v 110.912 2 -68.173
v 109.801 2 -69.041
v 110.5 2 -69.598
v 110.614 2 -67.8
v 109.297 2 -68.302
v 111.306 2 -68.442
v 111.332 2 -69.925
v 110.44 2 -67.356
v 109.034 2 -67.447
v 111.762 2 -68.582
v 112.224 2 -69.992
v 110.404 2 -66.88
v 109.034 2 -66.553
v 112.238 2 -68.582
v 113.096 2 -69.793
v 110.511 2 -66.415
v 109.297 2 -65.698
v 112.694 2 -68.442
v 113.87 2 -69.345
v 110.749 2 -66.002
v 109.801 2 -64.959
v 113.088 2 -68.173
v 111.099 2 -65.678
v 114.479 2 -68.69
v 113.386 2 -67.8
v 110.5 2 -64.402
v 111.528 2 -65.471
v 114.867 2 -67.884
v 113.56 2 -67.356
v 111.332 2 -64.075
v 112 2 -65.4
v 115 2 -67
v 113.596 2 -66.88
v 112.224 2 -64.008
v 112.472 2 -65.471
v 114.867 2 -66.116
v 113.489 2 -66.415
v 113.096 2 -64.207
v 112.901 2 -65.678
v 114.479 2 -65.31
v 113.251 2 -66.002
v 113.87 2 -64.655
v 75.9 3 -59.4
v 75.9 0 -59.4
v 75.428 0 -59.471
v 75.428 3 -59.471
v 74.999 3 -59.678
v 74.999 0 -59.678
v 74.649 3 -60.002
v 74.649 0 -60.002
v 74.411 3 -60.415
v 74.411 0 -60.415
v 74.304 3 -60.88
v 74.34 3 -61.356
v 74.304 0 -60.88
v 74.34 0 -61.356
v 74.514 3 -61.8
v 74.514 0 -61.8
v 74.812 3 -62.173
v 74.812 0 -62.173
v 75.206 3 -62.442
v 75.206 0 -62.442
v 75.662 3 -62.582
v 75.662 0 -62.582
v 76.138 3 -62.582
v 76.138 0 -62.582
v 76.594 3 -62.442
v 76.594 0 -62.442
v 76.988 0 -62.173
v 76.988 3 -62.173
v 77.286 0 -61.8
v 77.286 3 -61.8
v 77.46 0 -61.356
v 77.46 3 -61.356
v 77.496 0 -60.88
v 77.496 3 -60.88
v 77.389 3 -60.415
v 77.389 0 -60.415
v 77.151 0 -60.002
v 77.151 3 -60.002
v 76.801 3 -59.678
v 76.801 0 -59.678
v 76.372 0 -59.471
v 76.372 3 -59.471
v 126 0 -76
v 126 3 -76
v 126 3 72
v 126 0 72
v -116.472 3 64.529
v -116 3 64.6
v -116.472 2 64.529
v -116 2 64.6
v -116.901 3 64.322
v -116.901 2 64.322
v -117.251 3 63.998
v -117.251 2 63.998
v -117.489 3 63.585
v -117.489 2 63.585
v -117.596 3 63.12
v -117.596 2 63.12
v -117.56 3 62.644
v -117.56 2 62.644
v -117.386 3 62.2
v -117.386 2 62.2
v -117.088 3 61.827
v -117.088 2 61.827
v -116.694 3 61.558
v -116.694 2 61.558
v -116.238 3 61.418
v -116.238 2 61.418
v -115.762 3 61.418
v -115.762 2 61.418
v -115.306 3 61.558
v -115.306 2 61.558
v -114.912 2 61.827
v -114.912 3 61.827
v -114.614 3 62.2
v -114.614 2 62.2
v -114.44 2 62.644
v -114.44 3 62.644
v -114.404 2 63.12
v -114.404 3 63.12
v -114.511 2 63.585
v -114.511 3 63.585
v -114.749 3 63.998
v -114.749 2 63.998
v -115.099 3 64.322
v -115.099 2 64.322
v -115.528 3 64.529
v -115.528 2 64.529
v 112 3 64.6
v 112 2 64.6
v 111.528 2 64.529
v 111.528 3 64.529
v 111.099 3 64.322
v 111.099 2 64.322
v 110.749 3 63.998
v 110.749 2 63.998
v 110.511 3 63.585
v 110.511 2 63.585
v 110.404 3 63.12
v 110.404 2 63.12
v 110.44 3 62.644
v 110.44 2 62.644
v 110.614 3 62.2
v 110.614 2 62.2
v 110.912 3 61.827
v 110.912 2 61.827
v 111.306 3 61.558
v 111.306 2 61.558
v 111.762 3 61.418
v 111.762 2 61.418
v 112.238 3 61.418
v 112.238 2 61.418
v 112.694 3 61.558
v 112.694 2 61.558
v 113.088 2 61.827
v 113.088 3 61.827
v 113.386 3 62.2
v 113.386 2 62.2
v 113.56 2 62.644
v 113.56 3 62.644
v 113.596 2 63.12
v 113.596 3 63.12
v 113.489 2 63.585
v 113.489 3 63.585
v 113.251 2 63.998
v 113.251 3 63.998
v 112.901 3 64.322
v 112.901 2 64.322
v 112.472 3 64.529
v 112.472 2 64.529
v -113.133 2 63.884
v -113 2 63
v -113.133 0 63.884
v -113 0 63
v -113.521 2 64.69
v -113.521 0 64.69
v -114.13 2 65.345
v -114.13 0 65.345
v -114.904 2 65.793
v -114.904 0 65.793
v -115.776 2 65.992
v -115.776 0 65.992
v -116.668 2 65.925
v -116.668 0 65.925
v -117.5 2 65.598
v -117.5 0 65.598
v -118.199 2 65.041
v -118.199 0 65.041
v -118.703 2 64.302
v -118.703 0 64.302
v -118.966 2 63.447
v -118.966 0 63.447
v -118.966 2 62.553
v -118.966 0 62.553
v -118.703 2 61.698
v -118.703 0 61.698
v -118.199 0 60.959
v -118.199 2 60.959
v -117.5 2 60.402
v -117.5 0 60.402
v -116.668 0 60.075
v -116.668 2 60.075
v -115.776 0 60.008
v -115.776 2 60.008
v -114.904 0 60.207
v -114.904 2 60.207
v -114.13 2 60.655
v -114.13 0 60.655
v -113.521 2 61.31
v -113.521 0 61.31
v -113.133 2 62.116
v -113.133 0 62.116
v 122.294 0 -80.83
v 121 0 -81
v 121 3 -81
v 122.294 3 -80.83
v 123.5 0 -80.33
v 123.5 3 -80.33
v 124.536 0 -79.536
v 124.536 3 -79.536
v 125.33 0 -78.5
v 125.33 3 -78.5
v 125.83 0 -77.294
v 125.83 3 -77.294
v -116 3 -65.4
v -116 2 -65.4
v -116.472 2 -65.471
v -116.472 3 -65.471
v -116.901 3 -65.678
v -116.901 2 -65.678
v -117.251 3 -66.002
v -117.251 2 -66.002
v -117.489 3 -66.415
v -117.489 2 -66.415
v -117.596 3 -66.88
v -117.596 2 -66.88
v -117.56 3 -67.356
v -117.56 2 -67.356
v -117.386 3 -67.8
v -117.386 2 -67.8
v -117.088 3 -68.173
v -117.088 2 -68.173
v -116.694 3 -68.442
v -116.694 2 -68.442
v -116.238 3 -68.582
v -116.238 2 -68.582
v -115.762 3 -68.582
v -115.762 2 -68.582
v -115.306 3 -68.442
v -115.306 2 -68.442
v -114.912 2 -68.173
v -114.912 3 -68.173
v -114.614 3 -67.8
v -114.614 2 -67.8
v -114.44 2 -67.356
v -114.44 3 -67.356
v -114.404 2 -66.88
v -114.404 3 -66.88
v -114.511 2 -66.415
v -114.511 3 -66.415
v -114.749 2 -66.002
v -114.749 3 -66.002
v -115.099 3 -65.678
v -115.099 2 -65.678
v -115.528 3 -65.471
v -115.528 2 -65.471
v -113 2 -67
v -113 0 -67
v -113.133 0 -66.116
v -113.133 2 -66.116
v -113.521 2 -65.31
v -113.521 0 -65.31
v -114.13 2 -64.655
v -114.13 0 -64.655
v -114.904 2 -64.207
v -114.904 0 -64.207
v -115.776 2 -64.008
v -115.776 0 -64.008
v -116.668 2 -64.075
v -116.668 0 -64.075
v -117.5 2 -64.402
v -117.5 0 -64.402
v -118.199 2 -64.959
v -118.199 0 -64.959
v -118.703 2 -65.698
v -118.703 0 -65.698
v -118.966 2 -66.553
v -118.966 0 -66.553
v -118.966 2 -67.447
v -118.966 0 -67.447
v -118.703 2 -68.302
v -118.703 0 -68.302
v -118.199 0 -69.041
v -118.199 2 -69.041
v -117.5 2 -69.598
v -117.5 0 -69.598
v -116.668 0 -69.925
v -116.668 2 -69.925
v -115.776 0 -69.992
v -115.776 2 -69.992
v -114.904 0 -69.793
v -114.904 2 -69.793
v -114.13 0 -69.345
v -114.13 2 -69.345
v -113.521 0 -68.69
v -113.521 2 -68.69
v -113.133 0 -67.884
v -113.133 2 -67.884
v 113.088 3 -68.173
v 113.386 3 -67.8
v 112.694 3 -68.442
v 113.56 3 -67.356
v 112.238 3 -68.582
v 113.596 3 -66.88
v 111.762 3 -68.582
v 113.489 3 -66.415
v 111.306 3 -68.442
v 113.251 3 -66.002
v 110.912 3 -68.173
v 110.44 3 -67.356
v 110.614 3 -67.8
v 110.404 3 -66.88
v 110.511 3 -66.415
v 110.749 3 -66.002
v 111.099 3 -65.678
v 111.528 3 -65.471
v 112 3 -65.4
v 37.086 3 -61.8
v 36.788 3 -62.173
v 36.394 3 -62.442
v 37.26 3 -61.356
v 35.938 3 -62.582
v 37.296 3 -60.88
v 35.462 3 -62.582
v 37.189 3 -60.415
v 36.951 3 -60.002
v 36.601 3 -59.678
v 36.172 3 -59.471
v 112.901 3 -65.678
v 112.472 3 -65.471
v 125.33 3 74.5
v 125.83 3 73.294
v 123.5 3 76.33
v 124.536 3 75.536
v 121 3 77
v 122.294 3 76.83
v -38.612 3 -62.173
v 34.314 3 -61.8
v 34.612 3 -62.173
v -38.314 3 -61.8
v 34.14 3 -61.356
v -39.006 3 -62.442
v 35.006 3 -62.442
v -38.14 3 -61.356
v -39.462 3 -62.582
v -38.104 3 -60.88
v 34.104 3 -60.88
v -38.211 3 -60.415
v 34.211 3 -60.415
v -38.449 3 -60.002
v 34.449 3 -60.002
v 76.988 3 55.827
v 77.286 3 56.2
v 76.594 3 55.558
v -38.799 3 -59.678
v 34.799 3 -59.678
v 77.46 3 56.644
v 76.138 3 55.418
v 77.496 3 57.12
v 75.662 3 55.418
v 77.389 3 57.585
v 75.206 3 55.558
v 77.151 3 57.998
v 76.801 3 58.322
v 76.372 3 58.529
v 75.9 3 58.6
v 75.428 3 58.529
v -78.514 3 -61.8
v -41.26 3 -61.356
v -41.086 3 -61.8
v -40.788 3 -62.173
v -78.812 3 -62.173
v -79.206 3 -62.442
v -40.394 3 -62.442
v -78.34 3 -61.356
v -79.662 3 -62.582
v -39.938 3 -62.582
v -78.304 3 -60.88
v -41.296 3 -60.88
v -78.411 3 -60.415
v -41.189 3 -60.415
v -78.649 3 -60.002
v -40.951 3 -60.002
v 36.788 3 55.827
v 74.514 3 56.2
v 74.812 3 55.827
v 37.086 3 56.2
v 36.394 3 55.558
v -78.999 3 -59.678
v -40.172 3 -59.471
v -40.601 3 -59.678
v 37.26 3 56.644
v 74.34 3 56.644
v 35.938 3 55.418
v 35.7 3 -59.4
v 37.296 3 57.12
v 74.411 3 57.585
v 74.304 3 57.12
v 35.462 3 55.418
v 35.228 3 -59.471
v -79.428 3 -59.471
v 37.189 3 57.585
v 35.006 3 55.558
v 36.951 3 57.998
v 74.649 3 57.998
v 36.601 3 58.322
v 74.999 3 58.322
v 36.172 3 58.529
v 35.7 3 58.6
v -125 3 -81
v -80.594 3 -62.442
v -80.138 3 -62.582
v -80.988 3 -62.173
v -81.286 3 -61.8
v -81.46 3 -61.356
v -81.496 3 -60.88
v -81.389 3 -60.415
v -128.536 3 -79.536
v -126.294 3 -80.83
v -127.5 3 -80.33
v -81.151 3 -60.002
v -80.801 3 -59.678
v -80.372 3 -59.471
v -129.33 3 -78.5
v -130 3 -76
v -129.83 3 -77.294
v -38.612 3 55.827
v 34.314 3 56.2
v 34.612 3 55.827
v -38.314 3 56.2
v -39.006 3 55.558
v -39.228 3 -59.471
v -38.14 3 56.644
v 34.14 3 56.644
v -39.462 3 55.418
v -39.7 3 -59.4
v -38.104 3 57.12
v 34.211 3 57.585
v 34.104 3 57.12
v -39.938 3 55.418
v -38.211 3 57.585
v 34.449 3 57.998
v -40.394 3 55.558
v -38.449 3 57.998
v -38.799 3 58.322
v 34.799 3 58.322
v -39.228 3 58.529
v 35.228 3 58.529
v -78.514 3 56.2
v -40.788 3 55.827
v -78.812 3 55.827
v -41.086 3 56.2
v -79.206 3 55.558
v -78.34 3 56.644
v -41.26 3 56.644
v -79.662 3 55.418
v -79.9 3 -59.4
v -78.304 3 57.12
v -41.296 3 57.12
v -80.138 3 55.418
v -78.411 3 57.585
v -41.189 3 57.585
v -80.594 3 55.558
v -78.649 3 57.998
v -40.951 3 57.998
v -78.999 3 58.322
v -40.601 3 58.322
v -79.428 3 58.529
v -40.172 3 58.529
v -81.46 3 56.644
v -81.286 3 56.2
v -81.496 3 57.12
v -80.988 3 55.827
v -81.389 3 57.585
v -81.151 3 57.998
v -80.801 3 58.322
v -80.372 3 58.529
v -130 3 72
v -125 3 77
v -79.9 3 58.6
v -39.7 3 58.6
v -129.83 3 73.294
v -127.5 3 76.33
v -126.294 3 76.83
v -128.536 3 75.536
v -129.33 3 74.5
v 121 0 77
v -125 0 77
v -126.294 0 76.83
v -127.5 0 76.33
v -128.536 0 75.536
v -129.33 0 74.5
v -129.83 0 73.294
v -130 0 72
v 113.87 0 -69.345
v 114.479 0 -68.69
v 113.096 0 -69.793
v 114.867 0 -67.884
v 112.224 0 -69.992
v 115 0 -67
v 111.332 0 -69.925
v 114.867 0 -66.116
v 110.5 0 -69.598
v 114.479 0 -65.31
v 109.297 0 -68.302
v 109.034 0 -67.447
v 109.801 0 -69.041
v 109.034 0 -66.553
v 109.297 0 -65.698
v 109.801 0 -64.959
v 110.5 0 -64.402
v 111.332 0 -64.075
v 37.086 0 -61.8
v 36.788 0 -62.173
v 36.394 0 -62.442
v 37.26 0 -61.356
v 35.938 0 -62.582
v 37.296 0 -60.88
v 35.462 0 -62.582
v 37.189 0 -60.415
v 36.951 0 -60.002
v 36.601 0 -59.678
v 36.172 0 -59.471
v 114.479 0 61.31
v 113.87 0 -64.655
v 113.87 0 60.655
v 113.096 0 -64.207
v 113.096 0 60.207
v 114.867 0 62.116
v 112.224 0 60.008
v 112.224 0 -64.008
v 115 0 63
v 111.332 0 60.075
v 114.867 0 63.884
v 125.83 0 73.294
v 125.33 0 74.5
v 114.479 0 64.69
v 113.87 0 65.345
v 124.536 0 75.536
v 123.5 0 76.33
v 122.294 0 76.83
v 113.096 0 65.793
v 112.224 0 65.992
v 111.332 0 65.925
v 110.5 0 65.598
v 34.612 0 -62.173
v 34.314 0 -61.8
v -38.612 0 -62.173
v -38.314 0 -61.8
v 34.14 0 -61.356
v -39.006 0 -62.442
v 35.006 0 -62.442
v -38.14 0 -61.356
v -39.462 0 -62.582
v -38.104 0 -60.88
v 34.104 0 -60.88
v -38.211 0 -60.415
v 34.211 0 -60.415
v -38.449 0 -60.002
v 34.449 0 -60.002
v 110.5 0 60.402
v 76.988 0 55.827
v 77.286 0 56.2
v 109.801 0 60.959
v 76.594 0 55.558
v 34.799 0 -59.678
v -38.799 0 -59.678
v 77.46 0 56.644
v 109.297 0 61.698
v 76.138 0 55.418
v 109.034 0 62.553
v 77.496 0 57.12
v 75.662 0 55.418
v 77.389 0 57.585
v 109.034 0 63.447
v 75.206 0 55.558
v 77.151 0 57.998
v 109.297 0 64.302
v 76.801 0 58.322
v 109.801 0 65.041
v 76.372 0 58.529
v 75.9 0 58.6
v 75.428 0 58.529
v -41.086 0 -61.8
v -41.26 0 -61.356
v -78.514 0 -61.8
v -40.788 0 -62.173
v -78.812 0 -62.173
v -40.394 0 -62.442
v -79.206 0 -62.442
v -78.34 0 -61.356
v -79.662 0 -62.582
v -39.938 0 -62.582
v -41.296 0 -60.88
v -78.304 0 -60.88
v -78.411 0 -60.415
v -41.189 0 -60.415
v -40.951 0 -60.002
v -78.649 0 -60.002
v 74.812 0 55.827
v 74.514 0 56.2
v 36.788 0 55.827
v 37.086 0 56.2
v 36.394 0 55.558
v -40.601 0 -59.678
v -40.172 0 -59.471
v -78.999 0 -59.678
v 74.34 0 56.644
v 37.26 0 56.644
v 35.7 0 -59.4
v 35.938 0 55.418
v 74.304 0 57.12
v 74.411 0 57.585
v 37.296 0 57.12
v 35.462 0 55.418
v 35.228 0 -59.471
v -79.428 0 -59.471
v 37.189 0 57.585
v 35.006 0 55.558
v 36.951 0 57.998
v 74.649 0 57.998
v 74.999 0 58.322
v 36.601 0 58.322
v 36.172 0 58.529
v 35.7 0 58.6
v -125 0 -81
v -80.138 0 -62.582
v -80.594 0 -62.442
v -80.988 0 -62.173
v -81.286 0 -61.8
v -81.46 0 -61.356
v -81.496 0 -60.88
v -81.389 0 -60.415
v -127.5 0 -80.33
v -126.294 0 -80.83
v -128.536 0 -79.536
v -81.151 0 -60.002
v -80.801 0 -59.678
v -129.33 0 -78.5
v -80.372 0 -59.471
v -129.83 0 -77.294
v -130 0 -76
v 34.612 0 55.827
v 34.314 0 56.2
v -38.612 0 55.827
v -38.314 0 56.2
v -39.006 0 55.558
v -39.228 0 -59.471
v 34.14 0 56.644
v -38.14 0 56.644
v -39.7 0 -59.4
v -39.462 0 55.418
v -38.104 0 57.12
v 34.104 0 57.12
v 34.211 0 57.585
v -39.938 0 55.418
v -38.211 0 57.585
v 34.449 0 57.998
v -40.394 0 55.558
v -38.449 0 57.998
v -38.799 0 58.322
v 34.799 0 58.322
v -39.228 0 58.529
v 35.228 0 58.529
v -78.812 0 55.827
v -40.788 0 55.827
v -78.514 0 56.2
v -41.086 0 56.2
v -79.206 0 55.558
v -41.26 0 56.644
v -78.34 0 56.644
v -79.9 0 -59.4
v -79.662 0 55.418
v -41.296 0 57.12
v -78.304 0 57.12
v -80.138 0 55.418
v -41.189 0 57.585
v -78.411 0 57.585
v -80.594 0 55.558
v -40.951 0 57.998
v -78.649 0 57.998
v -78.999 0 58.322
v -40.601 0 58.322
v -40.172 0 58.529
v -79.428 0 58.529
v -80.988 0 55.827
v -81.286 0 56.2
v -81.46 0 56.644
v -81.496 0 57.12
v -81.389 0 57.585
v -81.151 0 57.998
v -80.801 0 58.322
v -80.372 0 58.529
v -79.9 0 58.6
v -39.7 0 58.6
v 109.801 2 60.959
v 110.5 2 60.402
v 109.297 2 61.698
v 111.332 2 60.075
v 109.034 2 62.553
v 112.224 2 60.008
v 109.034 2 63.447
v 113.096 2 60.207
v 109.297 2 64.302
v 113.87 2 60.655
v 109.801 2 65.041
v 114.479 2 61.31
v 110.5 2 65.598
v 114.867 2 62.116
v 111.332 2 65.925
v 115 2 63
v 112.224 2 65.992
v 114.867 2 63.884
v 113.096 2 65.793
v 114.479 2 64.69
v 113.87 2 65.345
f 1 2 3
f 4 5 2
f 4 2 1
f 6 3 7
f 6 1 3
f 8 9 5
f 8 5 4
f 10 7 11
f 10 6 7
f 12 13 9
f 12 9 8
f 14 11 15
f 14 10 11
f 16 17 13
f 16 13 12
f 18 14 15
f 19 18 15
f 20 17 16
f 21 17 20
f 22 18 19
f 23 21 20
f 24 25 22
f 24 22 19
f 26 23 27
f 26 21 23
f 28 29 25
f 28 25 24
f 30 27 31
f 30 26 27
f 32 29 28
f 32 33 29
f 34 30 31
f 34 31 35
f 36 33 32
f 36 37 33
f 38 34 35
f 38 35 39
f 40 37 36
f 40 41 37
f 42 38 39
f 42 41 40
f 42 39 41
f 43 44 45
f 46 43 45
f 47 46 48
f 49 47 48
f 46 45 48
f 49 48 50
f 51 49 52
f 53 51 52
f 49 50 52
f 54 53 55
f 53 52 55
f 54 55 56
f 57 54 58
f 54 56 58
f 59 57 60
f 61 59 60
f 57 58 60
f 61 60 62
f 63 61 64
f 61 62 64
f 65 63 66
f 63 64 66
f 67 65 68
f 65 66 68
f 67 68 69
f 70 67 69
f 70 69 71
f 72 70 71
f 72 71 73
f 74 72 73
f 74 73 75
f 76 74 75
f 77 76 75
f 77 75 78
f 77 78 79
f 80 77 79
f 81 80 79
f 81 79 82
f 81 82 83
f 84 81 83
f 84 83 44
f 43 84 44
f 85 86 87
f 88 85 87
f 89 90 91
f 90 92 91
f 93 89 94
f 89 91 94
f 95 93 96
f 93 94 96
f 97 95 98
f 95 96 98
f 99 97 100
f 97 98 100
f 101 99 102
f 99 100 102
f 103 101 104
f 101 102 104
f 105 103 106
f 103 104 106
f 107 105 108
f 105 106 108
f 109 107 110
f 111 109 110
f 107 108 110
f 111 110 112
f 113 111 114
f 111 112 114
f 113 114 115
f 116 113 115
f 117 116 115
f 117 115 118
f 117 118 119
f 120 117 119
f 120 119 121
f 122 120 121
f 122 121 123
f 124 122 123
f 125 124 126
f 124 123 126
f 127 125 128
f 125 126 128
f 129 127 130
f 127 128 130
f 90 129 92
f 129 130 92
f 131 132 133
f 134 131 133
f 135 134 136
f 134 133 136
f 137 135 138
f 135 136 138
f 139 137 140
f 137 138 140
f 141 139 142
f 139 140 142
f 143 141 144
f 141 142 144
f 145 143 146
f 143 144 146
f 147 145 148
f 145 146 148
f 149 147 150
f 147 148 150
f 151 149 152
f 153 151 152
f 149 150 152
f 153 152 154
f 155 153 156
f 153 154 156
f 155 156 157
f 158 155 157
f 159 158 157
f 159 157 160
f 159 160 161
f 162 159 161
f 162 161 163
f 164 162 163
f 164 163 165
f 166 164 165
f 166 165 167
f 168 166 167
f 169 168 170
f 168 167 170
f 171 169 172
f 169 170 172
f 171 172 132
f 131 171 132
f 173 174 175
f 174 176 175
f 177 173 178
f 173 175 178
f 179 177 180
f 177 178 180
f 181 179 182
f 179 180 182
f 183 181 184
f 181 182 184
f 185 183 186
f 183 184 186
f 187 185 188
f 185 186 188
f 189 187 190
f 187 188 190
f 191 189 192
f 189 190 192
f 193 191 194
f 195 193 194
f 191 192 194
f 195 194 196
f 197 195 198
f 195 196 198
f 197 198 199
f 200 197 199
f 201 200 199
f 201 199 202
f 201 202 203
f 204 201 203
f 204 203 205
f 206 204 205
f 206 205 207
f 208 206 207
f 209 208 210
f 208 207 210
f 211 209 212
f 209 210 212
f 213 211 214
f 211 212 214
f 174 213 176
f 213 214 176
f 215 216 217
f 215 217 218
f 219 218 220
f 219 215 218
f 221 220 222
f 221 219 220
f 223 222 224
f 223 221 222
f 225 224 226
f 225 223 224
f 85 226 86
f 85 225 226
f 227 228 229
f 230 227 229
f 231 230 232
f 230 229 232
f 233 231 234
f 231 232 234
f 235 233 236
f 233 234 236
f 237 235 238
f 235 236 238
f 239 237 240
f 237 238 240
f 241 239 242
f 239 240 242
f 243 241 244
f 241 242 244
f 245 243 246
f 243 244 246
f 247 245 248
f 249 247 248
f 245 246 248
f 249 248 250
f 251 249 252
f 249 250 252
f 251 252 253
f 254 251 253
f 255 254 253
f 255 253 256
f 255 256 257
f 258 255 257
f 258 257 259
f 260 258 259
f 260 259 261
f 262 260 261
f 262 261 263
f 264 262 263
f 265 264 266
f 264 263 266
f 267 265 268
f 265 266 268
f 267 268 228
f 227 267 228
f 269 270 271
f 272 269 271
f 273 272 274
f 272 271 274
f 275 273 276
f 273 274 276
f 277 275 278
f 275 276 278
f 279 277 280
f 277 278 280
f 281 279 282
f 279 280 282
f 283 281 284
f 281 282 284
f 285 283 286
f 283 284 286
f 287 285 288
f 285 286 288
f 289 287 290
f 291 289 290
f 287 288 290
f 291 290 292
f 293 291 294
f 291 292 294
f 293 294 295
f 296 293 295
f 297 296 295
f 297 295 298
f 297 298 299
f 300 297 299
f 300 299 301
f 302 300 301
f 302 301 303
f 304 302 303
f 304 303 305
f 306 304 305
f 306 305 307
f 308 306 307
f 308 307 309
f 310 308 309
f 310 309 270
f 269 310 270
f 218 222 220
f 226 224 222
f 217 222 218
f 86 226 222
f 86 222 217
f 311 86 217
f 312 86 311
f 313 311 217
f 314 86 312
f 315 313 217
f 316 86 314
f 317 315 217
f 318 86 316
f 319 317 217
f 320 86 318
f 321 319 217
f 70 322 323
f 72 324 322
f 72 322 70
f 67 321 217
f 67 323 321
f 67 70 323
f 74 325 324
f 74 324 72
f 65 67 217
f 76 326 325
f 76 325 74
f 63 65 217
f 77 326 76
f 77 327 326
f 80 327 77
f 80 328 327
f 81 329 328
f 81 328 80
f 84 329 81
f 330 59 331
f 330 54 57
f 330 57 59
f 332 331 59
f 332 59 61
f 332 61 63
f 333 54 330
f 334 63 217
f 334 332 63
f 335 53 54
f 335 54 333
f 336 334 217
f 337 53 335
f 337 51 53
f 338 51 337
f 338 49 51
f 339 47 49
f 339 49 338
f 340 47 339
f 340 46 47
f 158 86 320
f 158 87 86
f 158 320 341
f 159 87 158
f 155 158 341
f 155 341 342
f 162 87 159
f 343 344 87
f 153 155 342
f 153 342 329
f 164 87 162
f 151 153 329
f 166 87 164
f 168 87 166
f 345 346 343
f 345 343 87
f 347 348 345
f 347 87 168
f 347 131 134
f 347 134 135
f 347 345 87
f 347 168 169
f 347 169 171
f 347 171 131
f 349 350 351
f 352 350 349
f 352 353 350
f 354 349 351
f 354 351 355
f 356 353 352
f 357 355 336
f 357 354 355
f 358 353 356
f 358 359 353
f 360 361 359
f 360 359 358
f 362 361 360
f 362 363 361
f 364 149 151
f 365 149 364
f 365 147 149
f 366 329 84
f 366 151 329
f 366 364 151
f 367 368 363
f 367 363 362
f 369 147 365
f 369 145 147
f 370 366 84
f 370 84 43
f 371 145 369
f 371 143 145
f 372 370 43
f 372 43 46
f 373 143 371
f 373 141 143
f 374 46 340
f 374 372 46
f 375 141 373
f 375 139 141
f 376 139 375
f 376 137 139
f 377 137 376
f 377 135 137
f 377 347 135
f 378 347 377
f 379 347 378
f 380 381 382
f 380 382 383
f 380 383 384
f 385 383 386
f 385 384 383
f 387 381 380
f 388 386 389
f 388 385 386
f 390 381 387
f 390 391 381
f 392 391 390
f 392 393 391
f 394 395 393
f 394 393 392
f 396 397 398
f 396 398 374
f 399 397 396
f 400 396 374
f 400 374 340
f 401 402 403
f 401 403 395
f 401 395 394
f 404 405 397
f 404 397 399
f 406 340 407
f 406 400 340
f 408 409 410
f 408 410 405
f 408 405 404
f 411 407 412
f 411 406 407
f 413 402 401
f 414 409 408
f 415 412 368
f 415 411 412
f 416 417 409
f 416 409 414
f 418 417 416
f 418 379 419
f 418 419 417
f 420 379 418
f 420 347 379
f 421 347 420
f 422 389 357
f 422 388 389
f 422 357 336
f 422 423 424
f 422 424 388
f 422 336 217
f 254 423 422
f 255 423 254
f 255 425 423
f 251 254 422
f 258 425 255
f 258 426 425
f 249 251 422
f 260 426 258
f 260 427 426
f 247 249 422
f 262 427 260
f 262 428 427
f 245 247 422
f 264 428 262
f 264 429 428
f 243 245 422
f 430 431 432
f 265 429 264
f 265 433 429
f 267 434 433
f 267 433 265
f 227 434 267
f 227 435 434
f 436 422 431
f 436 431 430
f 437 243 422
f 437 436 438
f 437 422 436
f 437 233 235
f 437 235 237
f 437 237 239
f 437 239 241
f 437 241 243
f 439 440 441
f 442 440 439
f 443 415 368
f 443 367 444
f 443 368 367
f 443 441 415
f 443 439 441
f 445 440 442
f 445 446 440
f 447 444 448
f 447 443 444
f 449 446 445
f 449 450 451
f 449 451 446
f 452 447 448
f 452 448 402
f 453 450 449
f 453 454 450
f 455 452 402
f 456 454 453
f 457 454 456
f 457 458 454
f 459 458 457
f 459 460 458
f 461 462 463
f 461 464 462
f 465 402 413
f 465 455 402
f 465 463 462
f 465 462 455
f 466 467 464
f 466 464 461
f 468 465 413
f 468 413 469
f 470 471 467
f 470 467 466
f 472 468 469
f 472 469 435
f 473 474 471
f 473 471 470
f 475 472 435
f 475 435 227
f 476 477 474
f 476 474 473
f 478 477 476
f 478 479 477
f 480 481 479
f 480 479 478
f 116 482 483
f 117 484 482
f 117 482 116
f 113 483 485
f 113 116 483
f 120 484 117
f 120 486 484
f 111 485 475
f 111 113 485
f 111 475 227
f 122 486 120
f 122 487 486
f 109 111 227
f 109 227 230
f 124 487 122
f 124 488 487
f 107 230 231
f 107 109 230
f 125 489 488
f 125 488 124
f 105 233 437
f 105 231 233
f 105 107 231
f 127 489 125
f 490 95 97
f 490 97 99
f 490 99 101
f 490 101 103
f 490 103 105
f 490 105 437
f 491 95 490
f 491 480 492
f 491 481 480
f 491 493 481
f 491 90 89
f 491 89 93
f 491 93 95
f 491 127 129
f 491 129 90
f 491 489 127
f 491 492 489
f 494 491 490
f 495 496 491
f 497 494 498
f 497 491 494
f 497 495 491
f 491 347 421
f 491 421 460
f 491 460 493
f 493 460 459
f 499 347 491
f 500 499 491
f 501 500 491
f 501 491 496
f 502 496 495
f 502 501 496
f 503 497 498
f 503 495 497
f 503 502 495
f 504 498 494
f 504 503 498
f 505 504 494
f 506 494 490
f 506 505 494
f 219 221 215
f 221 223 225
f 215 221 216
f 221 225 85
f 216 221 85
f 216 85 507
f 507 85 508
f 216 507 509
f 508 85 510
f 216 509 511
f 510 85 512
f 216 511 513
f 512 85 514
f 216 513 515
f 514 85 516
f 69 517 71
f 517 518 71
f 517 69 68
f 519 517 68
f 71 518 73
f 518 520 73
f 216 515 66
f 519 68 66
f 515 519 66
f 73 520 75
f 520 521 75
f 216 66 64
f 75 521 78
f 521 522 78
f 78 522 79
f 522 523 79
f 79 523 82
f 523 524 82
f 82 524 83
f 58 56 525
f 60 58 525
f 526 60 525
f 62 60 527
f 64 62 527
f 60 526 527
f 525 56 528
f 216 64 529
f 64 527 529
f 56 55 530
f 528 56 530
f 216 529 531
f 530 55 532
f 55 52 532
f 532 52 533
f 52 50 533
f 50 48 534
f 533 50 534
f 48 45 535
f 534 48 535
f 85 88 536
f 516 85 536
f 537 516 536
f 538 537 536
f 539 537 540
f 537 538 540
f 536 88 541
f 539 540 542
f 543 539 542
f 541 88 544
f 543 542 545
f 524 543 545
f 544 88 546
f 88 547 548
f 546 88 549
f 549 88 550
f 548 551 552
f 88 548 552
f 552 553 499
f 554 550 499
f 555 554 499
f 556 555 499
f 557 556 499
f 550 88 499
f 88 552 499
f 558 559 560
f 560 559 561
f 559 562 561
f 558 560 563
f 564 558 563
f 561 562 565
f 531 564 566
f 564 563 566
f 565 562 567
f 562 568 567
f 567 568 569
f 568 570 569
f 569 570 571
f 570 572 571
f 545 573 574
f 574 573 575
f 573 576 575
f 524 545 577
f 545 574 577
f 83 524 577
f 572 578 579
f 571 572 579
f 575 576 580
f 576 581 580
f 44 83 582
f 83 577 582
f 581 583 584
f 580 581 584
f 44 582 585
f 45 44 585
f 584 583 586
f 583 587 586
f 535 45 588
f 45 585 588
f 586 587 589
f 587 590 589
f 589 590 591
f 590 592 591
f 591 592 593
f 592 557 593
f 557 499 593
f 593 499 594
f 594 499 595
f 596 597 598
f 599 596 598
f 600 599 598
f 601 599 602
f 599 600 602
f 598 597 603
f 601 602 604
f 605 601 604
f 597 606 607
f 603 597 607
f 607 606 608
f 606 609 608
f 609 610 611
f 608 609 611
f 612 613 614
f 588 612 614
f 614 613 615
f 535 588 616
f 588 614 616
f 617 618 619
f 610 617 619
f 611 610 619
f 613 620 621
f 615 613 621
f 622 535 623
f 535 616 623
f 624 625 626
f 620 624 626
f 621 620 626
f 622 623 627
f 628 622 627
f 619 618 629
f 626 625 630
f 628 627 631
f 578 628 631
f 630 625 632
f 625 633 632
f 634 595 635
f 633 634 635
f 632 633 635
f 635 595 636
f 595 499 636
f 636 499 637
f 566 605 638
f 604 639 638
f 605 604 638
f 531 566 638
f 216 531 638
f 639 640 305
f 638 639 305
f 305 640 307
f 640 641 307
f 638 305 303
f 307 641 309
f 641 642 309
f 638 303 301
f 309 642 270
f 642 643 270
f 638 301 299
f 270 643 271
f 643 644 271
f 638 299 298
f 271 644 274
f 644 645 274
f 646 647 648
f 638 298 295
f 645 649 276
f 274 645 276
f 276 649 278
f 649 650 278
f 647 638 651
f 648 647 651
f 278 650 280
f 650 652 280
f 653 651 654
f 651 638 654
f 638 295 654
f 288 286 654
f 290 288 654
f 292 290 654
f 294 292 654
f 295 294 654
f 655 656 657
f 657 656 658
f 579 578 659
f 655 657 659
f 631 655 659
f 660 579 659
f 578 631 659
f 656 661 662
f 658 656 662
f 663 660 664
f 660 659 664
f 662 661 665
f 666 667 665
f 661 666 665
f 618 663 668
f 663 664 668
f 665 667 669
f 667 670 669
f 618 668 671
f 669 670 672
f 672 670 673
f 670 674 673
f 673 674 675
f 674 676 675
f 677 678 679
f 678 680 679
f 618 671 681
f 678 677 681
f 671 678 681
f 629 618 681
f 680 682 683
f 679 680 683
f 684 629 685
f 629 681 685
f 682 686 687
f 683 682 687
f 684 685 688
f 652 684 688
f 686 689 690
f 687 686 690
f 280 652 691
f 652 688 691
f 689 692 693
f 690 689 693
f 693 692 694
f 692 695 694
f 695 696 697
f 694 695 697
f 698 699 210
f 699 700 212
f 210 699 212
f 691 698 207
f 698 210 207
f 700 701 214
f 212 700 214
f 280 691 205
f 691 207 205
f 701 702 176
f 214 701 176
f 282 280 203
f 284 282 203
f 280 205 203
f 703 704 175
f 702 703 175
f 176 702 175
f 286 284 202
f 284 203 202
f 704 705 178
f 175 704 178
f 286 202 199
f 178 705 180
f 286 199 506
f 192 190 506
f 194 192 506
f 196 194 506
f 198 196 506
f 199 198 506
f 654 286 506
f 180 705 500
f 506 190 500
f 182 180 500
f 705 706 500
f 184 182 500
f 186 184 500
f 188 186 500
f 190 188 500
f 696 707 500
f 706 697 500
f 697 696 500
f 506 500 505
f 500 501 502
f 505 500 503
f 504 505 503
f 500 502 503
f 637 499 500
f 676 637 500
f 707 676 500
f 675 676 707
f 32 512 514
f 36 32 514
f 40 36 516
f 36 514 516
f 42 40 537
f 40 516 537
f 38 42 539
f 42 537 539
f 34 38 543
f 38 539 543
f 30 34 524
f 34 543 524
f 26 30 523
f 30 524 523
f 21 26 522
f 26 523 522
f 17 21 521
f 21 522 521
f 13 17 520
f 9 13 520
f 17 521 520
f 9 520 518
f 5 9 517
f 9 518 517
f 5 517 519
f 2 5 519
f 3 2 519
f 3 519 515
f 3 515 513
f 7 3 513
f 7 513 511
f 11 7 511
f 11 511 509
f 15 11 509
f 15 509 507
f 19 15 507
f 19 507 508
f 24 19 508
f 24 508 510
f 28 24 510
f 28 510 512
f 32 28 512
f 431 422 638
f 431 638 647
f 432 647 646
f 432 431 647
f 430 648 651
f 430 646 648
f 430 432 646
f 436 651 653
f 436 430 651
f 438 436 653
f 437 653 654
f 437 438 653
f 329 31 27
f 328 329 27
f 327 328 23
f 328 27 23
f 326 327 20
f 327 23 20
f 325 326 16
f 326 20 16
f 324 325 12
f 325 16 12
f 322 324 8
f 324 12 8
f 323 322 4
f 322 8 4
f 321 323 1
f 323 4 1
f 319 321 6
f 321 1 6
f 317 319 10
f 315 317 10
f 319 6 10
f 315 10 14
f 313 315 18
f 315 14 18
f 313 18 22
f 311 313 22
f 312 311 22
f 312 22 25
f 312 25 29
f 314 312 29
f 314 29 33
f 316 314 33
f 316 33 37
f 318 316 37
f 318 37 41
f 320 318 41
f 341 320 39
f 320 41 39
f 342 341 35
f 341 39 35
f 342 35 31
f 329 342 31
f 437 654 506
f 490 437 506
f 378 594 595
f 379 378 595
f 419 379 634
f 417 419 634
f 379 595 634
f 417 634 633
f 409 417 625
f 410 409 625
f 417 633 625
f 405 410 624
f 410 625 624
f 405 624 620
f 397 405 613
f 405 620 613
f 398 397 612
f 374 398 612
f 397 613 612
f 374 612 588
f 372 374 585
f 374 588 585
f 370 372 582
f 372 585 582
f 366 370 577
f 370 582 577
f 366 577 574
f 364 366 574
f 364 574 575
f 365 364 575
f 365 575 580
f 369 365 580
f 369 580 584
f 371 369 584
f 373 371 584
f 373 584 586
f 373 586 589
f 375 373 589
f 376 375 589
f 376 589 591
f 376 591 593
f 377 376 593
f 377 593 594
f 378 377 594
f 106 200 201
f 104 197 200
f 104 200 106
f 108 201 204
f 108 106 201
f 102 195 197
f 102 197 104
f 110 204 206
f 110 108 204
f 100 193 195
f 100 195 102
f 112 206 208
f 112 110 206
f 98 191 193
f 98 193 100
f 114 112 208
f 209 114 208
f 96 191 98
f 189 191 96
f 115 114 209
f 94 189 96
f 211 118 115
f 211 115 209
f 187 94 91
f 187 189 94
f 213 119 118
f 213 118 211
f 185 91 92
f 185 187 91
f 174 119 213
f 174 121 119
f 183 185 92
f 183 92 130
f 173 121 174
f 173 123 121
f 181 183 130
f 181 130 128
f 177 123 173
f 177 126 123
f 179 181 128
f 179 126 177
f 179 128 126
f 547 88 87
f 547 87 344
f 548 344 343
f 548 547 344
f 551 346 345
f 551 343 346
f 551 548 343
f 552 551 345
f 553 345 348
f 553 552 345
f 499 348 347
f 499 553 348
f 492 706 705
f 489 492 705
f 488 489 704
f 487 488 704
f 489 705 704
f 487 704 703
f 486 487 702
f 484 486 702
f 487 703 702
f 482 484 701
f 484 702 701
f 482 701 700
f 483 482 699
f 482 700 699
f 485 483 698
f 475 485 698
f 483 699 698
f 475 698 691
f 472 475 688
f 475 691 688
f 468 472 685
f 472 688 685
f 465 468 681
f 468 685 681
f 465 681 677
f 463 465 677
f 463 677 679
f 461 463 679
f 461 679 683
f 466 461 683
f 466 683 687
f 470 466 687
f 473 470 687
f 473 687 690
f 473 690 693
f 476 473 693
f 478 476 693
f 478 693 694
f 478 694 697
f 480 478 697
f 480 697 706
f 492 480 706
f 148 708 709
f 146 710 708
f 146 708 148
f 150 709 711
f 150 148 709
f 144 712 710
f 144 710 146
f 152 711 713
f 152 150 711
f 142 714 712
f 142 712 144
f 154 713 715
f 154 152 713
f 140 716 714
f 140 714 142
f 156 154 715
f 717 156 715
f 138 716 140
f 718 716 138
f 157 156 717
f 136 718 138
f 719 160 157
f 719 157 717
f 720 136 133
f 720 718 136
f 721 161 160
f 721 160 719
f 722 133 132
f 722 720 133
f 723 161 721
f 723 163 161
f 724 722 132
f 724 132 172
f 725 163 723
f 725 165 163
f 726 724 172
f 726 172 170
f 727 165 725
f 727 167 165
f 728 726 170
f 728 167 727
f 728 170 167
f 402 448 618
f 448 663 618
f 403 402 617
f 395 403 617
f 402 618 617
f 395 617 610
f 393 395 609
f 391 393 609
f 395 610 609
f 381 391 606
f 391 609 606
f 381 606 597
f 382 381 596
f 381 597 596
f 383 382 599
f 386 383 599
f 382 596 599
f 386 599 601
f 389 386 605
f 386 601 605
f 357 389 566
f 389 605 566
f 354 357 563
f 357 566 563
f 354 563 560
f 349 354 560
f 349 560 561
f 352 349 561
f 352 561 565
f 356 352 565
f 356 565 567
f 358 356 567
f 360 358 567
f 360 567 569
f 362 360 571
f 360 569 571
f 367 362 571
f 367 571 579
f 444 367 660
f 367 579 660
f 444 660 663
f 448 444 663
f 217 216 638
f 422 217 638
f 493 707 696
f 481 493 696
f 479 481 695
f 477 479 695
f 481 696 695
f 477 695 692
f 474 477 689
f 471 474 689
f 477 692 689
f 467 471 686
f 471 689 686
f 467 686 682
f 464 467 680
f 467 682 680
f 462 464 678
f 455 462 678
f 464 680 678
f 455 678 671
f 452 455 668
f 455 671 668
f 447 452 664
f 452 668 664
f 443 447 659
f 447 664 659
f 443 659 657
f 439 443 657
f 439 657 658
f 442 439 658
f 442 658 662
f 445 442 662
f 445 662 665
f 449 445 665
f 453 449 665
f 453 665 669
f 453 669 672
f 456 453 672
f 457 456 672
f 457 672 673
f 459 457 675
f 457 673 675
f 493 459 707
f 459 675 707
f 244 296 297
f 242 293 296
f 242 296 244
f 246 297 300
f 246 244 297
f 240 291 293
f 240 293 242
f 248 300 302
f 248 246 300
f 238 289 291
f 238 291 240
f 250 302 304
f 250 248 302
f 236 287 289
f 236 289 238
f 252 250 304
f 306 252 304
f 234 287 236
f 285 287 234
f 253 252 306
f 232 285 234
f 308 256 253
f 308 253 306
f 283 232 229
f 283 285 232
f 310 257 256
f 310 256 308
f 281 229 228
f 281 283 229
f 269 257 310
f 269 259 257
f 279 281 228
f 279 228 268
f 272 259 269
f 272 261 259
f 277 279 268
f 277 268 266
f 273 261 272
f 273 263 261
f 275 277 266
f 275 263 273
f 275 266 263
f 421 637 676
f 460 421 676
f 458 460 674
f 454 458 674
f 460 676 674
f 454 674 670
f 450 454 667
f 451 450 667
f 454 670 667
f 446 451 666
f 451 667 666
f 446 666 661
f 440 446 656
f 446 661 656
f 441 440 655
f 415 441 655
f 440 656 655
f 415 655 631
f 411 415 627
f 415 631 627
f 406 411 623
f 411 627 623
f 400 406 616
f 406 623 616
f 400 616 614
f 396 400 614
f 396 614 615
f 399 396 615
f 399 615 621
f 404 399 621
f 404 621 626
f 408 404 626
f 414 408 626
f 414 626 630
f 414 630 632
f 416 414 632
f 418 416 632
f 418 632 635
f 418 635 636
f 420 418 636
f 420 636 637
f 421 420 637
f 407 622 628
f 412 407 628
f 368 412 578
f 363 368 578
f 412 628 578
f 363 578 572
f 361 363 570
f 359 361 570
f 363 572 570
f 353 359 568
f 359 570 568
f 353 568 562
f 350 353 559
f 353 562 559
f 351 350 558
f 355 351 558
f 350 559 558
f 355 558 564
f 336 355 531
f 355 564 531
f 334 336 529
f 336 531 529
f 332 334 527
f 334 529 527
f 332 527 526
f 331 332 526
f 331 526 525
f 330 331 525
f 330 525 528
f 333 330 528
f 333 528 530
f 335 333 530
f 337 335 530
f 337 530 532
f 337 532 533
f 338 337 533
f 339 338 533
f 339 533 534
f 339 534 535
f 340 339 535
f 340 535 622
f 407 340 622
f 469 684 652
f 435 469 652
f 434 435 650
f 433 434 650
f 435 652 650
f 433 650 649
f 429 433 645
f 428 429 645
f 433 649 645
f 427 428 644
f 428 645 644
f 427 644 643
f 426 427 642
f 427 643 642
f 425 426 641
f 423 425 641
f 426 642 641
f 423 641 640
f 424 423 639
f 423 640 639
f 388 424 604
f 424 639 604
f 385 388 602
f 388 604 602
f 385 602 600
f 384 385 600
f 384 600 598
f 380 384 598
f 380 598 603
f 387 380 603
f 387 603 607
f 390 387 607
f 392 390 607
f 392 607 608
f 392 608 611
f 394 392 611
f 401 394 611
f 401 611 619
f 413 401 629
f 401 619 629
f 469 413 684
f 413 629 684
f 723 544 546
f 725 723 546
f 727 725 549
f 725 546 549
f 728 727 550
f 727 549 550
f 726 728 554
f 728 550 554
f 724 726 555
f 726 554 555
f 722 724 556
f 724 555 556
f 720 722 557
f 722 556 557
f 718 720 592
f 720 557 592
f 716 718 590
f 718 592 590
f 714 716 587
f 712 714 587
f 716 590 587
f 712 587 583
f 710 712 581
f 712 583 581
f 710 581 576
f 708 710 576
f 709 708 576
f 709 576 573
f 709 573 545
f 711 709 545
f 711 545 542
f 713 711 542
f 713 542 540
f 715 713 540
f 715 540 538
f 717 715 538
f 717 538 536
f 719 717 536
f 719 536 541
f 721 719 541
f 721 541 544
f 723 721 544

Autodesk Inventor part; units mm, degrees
ref_plane "YZ Plane" through (0, 0, 0) normal (1, 0, 0) x (0, 1, 0)
ref_plane "XZ Plane" through (0, 0, 0) normal (0, 1, 0) x (-1, 0, 0)
ref_plane "XY Plane" through (0, 0, 0) normal (0, 0, 1) x (1, 0, 0)
sketch "スケッチ1" plane through (0, 0, 0) normal (0, 1, 0) x (-1, 0, 0)
  line L0 (130, 81) -> (-130, 81)
  line L1 (-130, 81) -> (-130, -81)
  line L2 (-130, -81) -> (130, -81)
  line L3 (130, -81) -> (130, 81)
  line L4 (130, 81) -> (-130, -81) construction
  line L5 (-130, 81) -> (130, -81) construction
  point P0 (0, 0)
  dimension "d0" = 260
  dimension "d1" = 162
extrude "押し出し1" add sketch "スケッチ1" along normal blind 3
sketch "スケッチ7" plane through (0, 3, 0) normal (0, 1, 0) x (1, 0, 0)
  line L0 (-130, 81) -> (-130, -81) projected
  line L1 (130, -81) -> (130, 81) projected
  line L2 (130, 81) -> (-130, 81) projected
  point P0 (0, 0)
  point P1 (-116, 67)
  point P2 (112, 67)
  point P3 (112, -63)
  point P4 (-116, -63)
  dimension "d23" = 14
  dimension "d25" = 130
  dimension "d26" = 130
  dimension "d27" = 14
  dimension "d29" = 14
  dimension "d38" = 228
  dimension "d39" = 228
  dimension "d40" = 14
hole "穴1" at (-116, 3, -67) at (112, 3, -67) at (112, 3, 63) at (-116, 3, 63) direction (0, -1, 0) diameter 3.2 depth 8
sketch "スケッチ8" plane through (0, 3, 0) normal (0, 1, 0) x (1, 0, 0)
  line L0 (130, 81) -> (-130, 81) projected
  line L1 (-130, 81) -> (126, 81)
  line L2 (126, 81) -> (126, -77)
  line L3 (126, -77) -> (-130, -77)
  line L4 (-130, -77) -> (-130, 81)
  circle A0 centre (-116, 67) radius 1.6 projected
  circle A1 centre (112, 67) radius 1.6 projected
  circle A2 centre (-116, -63) radius 1.6 projected
  circle A3 centre (-116, -63) radius 1.6 projected
  circle A4 centre (112, -63) radius 1.6 projected
  circle A5 centre (112, 67) radius 1.6 projected
  circle A6 centre (-116, 67) radius 1.6 projected
  line L5 (130, -81) -> (130, 81) projected
  line L6 (130, 81) -> (-130, 81) projected
  line L7 (-130, 81) -> (-130, -81) projected
  line L8 (-130, -81) -> (130, -81) projected
  point P0 (0, 0)
  dimension "d41" = 14
  dimension "d42" = 14
  dimension "d43" = 14
extrude "押し出し4" cut sketch "スケッチ8" against normal blind 10 contours L5 L8 L7 L3 L2 L0
fillet "フィレット1" radius 5 4 edges at (-130, 1.5, -81) (-130, 1.5, 77) (126, 1.5, -81) (126, 1.5, 77)
sketch "スケッチ9" plane through (0, 3, 0) normal (0, 1, 0) x (1, 0, 0)
  line L0 (-130, 76) -> (-130, -72) projected
  line L1 (-89.9, 81) -> (-69.9, 81)
  line L2 (-69.8, 81) -> (-49.8, 81)
  line L3 (-49.7, 81) -> (-29.7, 81)
  line L4 (-29.7, -77) -> (-49.7, -77)
  line L5 (0, 0) -> (0, 16.1014)
  circle A0 centre (-116, 67) radius 1.6 projected
  line L6 (126, -72) -> (126, 76) projected
  line L7 (121, 81) -> (-125, 81) projected
  line L8 (-125, -77) -> (121, -77) projected
  line L9 (-69.8, 81) -> (-49.8, 81)
  line L10 (-49.8, 81) -> (-49.8, -77)
  line L11 (-49.8, -77) -> (-69.8, -77)
  line L12 (-69.8, -77) -> (-69.8, 81)
  line L13 (45.8, 81) -> (65.8, 81)
  line L14 (65.8, 81) -> (65.8, -77)
  line L15 (65.8, -77) -> (45.8, -77)
  line L16 (45.8, -77) -> (45.8, 81)
  line L17 (-69.9, 81) -> (-89.9, 81)
  line L18 (-89.9, 81) -> (-89.9, -77)
  line L19 (-89.9, -77) -> (-69.9, -77)
  line L20 (-69.9, -77) -> (-69.9, 81)
  line L21 (121, 81) -> (-125, 81) projected
  line L22 (-49.7, 81) -> (-29.7, 81)
  line L23 (-29.7, 81) -> (-29.7, -77)
  line L24 (-29.7, -77) -> (-49.7, -77)
  line L25 (-49.7, -77) -> (-49.7, 81)
  point P0 (-79.9, 61)
  point P1 (-39.7, 61)
  point P2 (-79.9, -57)
  point P3 (-39.7, -57)
  point P4 (75.9, 61)
  point P5 (35.7, 61)
  point P6 (75.9, -57)
  point P7 (35.7, -57)
  point P8 (-79.9, 81)
  point P9 (-59.8, 61)
  point P10 (55.8, 61)
  point P11 (55.8, -57)
  point P12 (-59.8, -57)
  dimension "d77" = 118
  dimension "d114" = 20
  dimension "d115" = 20
  dimension "d116" = 20
  dimension "d117" = 20
  dimension "d118" = 20
  dimension "d119" = 20
  dimension "d120" = 20
  dimension "d121" = 20
  dimension "d122" = 70.2
  dimension "d123" = 70.2
  dimension "d124" = 20
  dimension "d125" = 70.2
  dimension "d126" = 70.2
  dimension "d127" = 10
  dimension "d128" = 10
  dimension "d129" = 10
  dimension "d130" = 10
  dimension "d131" = 10
  dimension "d132" = 0.1
  dimension "d133" = 50.1
  dimension "d134" = 50.1
  dimension "d135" = 10
  dimension "d136" = 118
  dimension "d137" = 50.1
  dimension "d138" = 10
  dimension "d139" = 0.1
  dimension "d140" = 10
  dimension "d141" = 90.3
  dimension "d142" = 90.3
  dimension "d143" = 90.3
  dimension "d144" = 90.3
  dimension "d145" = 50.1
hole "穴2" at (-79.9, 3, -61) at (-39.7, 3, -61) at (-79.9, 3, 57) at (-39.7, 3, 57) at (35.7, 3, 57) at (75.9, 3, 57) at (35.7, 3, -61) at (75.9, 3, -61) direction (0, -1, 0) diameter 3.2 depth 8
sketch "スケッチ12" plane through (0, 0, 0) normal (0, -1, 0) x (1, 0, 0)
  circle A0 centre (75.9, -61) radius 1.6 projected
  circle A1 centre (35.7, -61) radius 1.6 projected
  circle A2 centre (75.9, 57) radius 1.6 projected
  circle A3 centre (35.7, 57) radius 1.6 projected
  circle A4 centre (-39.7, 57) radius 1.6 projected
  circle A5 centre (-79.9, 57) radius 1.6 projected
  circle A6 centre (-39.7, -61) radius 1.6 projected
  circle A7 centre (-79.9, -61) radius 1.6 projected
  arc A8 (126, 72) -> (121, 77) centre (121, 72) ccw projected
  line L0 (121, 77) -> (-125, 77) projected
  arc A9 (-125, 77) -> (-130, 72) centre (-125, 72) ccw projected
  line L1 (-130, -76) -> (-130, 72) projected
  arc A10 (-130, -76) -> (-125, -81) centre (-125, -76) ccw projected
  line L2 (121, -81) -> (-125, -81) projected
  arc A11 (121, -81) -> (126, -76) centre (121, -76) ccw projected
  line L3 (126, -76) -> (126, 72) projected
  circle A12 centre (-116, 63) radius 1.6 projected
  circle A13 centre (112, 63) radius 1.6 projected
  circle A14 centre (112, -67) radius 1.6 projected
  circle A15 centre (-116, -67) radius 1.6 projected
  circle A16 centre (-116, 63) radius 3
  circle A17 centre (-116, -67) radius 3
  circle A18 centre (112, -67) radius 3
  circle A19 centre (112, 63) radius 3
  point P0 (0, 0)
  dimension "d108" = 6
  dimension "d109" = 6
  dimension "d110" = 6
  dimension "d111" = 6
  dimension "d14" = 30
  dimension "d15" = 30
  dimension "d16" = 30
  dimension "d17" = 30
extrude "押し出し6" cut sketch "スケッチ12" against normal blind 2 contours A12 | A13 | A14 | A15 | A16 | A17 | A18 | A19
equation "\"d26\" = d25"
equation "\"d27\" = d23"
equation "\"d39\" = d38"
equation "\"d42\" = d41"
equation "\"d43\" = d41"
equation "\"d115\" = d114"
equation "\"d116\" = d114"
equation "\"d117\" = d116"
equation "\"d119\" = d118"
equation "\"d120\" = d118"
equation "\"d121\" = d120"
equation "\"d123\" = d122"
equation "\"d126\" = d123"
equation "\"d129\" = d127"
equation "\"d130\" = d129"
equation "\"d139\" = d132"
equation "\"d140\" = d138"
equation "\"d109\" = d108"
equation "\"d110\" = d109"
equation "\"d111\" = d108"
properties part number "BP_BOX-Under" material "アセタール樹脂、白"
